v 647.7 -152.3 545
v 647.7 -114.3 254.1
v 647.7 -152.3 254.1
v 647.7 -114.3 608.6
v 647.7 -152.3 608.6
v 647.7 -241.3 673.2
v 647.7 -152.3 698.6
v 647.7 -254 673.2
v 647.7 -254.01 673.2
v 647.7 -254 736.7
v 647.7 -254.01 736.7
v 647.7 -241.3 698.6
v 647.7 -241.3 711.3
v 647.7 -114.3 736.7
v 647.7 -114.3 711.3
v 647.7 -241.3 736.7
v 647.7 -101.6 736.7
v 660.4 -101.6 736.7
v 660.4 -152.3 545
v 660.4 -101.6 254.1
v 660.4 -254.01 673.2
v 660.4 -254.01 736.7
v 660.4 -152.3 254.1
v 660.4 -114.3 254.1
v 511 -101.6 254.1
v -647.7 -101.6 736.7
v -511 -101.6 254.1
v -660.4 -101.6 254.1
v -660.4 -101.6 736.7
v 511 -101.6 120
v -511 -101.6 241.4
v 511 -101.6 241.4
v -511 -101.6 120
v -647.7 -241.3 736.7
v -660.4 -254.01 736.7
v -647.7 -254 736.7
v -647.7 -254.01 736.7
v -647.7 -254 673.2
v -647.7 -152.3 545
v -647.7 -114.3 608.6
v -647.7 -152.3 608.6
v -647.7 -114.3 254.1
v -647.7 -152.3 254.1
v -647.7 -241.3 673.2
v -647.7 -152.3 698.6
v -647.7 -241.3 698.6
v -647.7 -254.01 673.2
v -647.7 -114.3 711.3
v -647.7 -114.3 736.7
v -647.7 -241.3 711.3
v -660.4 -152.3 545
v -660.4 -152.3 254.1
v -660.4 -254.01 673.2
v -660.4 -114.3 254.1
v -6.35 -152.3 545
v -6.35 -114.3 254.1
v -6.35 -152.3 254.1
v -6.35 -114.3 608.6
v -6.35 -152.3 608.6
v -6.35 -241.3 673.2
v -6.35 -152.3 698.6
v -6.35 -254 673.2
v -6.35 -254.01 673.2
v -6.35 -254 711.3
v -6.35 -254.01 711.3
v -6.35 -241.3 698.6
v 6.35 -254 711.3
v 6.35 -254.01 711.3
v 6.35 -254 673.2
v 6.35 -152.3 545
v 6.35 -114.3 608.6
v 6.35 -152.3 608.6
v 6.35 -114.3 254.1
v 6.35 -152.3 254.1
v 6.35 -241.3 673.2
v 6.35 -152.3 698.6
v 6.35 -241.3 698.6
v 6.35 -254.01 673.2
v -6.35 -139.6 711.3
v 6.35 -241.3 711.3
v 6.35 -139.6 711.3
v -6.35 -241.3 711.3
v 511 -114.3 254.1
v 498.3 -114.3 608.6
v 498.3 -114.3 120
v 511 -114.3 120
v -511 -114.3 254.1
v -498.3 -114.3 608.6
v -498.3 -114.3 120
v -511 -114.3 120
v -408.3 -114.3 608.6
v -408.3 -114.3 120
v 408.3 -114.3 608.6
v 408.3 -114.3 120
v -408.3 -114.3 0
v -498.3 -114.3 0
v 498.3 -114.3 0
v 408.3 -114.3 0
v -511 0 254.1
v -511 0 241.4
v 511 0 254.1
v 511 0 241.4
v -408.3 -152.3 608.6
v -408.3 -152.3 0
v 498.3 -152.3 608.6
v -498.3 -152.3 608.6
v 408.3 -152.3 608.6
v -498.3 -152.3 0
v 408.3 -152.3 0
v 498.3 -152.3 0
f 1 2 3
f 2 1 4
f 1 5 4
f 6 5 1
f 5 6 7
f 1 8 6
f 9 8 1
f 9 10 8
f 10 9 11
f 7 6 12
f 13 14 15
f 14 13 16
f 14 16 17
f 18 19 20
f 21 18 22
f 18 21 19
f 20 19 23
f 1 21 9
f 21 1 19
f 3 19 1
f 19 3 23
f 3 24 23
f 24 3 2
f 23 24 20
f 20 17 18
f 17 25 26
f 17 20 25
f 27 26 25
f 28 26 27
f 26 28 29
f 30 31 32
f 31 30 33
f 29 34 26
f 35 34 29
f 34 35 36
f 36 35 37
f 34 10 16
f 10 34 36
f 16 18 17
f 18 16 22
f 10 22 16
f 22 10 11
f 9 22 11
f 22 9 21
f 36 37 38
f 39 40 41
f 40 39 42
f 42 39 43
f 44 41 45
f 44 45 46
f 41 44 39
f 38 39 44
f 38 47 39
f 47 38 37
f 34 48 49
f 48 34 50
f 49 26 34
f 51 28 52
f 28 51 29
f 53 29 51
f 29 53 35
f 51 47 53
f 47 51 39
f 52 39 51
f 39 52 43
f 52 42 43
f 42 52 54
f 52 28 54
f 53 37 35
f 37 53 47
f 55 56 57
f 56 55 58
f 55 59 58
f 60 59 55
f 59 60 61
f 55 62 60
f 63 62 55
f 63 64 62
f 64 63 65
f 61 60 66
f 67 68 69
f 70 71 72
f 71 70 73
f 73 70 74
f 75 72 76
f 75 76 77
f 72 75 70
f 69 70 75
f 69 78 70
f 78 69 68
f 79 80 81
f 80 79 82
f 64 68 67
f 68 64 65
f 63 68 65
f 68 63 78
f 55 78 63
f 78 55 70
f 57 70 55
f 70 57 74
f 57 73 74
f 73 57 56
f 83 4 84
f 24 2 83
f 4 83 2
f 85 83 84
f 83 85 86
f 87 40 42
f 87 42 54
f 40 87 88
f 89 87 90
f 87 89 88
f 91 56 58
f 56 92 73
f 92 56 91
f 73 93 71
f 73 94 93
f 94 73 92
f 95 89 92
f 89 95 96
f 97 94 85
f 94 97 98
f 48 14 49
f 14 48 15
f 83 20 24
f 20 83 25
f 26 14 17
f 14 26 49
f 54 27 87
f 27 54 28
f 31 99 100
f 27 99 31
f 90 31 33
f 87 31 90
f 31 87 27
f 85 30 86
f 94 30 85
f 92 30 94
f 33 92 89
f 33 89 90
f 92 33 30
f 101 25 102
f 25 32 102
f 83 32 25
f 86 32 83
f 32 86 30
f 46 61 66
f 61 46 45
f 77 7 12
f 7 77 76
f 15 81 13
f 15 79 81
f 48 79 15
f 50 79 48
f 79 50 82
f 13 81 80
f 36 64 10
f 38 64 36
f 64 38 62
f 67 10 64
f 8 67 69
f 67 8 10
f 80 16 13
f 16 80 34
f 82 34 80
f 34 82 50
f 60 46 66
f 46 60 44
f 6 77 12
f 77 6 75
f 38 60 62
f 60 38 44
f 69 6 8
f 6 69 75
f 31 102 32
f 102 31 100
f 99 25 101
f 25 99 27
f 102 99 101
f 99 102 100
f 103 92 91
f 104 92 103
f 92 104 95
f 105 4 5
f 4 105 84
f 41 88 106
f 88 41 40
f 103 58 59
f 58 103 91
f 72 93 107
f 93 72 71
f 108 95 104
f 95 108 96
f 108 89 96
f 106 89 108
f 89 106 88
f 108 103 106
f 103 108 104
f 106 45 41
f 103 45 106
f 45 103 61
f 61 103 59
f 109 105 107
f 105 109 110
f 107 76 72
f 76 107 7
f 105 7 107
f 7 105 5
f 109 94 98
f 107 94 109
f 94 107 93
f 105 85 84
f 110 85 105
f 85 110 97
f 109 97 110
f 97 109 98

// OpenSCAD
// file: common.scad
pad=0.1;
in=25.4;
zero=0.01;

wood=in/2;
// 2x4 actual dimensions
two=38;
four=90;

bed_x=1530;
bed_y=2030;
bed_z=12*in;
bed_wood=wood;

overhang=10*in;

caster_x=20.5;
caster_y=42;
wheel_z=28;

leg_angle=atan(overhang/(bed_z-bed_wood-two));
function leg_y(z)=bed_y-overhang+tan(leg_angle)*z-wood;
leg_x=four+wood*2;

mattress_r=2*in;

pillowboard_y=4*in;
pillowboard_depth=bed_wood+two;

spine_end=0;
spines=6;
spine_gap=(bed_y-four-spine_end*2)/(spines-1);

module corner(r) {
	offset(r*2)
	offset(-r*2)
	children();
}

module wood(w=wood) {
	linear_extrude(height=w)
	children();
}

module dirror_y(y=0) {
	children();
	translate([0,y])
	mirror([0,1])
	children();

}

module dirror_x(x=0) {
	children();
	translate([x,0])
	mirror([1,0])
	children();

}
// main file
include <common.scad>

pillowboard_x=58*in;
pillowboard_z=22*in;
pillowboard_border=in*3;

radiator_z=545;

neato=120;

back_x=bed_x-overhang*2;
back_z=bed_z-neato;

shelf_z=1*in;
shelf_y=6*in;

backstop_z=shelf_z*2+wood;

module back() {
	translate([-back_x/2,bed_z-back_z])
	square([back_x,back_z]);

	translate([-pillowboard_x/2+pillowboard_border,bed_z-pillowboard_depth])
	square([pillowboard_x-pillowboard_border*2,pillowboard_z-pillowboard_border]);
	
}

module end_cap() {
	cap_z=bed_z+pillowboard_z-pillowboard_depth-pillowboard_border-radiator_z;
	cap_extra=cap_z/2;

	square([two+wood,pillowboard_z-pillowboard_border]);
	hull() {
		square([two+wood,cap_z]);

		translate([shelf_y,0])
		square([zero,backstop_z]);
	}
}

module middle_cap() {
	difference() {
		end_cap();
		translate([-pad,-pad])
		square([shelf_y+pad*2,shelf_z+pad]);
		square([two,four+shelf_z]);
	}
}

module shelf() {
	translate([pillowboard_border-pillowboard_x/2,-shelf_y])
	square([pillowboard_x-pillowboard_border*2,shelf_y]);
}

module backstop() {
	translate([-pillowboard_x/2+pillowboard_border,0])
	square([pillowboard_x-pillowboard_border*2,backstop_z]);
}

module pillowboard_base() {
	translate([-bed_x/2+overhang,0])
	square([bed_x-overhang*2,pillowboard_y]);
}

module headboard() {
	translate([0,-pillowboard_y,0])
	rotate([90,0])
	wood()
	back();

	translate([0,-pillowboard_y,bed_z-pillowboard_depth+pillowboard_z-wood-pillowboard_border-shelf_z])
	wood()
	shelf();

	translate([0,-pillowboard_y-shelf_y+wood,bed_z-pillowboard_depth+pillowboard_z-pillowboard_border-backstop_z])
	rotate([90,0])
	wood()
	backstop();
		
	dirror_x()
	translate([pillowboard_x/2-pillowboard_border-wood,-pillowboard_y,bed_z+pillowboard_z-pillowboard_depth-pillowboard_border])
	rotate([-90,0,-90])
	wood()
	end_cap();
		
	dirror_x()
	translate([-wood/2,-pillowboard_y,bed_z+pillowboard_z-pillowboard_depth-pillowboard_border])
	rotate([-90,0,-90])
	wood()
	middle_cap();

	translate([0,-pillowboard_y,bed_z-pillowboard_depth-wood])
	wood()
	pillowboard_base();

}

module headboard_post() {
	dirror_x()
	color("lime")
	translate([-bed_x/2+overhang+wood,-pillowboard_y-wood-two])
	cube([four,two,bed_z-pillowboard_depth+pillowboard_z-pillowboard_border-shelf_z-wood-four]);
}

module headboard_brace() {
	color("green")
	translate([pillowboard_border-pillowboard_x/2+wood,-pillowboard_y-wood-two,bed_z-pillowboard_depth+pillowboard_z-pillowboard_border-shelf_z-wood-four])
	cube([pillowboard_x-pillowboard_border*2-wood*2,two,four]);
}

module headboard_handcut() {
	headboard_post();
	headboard_brace();
}

headboard();
headboard_handcut();
